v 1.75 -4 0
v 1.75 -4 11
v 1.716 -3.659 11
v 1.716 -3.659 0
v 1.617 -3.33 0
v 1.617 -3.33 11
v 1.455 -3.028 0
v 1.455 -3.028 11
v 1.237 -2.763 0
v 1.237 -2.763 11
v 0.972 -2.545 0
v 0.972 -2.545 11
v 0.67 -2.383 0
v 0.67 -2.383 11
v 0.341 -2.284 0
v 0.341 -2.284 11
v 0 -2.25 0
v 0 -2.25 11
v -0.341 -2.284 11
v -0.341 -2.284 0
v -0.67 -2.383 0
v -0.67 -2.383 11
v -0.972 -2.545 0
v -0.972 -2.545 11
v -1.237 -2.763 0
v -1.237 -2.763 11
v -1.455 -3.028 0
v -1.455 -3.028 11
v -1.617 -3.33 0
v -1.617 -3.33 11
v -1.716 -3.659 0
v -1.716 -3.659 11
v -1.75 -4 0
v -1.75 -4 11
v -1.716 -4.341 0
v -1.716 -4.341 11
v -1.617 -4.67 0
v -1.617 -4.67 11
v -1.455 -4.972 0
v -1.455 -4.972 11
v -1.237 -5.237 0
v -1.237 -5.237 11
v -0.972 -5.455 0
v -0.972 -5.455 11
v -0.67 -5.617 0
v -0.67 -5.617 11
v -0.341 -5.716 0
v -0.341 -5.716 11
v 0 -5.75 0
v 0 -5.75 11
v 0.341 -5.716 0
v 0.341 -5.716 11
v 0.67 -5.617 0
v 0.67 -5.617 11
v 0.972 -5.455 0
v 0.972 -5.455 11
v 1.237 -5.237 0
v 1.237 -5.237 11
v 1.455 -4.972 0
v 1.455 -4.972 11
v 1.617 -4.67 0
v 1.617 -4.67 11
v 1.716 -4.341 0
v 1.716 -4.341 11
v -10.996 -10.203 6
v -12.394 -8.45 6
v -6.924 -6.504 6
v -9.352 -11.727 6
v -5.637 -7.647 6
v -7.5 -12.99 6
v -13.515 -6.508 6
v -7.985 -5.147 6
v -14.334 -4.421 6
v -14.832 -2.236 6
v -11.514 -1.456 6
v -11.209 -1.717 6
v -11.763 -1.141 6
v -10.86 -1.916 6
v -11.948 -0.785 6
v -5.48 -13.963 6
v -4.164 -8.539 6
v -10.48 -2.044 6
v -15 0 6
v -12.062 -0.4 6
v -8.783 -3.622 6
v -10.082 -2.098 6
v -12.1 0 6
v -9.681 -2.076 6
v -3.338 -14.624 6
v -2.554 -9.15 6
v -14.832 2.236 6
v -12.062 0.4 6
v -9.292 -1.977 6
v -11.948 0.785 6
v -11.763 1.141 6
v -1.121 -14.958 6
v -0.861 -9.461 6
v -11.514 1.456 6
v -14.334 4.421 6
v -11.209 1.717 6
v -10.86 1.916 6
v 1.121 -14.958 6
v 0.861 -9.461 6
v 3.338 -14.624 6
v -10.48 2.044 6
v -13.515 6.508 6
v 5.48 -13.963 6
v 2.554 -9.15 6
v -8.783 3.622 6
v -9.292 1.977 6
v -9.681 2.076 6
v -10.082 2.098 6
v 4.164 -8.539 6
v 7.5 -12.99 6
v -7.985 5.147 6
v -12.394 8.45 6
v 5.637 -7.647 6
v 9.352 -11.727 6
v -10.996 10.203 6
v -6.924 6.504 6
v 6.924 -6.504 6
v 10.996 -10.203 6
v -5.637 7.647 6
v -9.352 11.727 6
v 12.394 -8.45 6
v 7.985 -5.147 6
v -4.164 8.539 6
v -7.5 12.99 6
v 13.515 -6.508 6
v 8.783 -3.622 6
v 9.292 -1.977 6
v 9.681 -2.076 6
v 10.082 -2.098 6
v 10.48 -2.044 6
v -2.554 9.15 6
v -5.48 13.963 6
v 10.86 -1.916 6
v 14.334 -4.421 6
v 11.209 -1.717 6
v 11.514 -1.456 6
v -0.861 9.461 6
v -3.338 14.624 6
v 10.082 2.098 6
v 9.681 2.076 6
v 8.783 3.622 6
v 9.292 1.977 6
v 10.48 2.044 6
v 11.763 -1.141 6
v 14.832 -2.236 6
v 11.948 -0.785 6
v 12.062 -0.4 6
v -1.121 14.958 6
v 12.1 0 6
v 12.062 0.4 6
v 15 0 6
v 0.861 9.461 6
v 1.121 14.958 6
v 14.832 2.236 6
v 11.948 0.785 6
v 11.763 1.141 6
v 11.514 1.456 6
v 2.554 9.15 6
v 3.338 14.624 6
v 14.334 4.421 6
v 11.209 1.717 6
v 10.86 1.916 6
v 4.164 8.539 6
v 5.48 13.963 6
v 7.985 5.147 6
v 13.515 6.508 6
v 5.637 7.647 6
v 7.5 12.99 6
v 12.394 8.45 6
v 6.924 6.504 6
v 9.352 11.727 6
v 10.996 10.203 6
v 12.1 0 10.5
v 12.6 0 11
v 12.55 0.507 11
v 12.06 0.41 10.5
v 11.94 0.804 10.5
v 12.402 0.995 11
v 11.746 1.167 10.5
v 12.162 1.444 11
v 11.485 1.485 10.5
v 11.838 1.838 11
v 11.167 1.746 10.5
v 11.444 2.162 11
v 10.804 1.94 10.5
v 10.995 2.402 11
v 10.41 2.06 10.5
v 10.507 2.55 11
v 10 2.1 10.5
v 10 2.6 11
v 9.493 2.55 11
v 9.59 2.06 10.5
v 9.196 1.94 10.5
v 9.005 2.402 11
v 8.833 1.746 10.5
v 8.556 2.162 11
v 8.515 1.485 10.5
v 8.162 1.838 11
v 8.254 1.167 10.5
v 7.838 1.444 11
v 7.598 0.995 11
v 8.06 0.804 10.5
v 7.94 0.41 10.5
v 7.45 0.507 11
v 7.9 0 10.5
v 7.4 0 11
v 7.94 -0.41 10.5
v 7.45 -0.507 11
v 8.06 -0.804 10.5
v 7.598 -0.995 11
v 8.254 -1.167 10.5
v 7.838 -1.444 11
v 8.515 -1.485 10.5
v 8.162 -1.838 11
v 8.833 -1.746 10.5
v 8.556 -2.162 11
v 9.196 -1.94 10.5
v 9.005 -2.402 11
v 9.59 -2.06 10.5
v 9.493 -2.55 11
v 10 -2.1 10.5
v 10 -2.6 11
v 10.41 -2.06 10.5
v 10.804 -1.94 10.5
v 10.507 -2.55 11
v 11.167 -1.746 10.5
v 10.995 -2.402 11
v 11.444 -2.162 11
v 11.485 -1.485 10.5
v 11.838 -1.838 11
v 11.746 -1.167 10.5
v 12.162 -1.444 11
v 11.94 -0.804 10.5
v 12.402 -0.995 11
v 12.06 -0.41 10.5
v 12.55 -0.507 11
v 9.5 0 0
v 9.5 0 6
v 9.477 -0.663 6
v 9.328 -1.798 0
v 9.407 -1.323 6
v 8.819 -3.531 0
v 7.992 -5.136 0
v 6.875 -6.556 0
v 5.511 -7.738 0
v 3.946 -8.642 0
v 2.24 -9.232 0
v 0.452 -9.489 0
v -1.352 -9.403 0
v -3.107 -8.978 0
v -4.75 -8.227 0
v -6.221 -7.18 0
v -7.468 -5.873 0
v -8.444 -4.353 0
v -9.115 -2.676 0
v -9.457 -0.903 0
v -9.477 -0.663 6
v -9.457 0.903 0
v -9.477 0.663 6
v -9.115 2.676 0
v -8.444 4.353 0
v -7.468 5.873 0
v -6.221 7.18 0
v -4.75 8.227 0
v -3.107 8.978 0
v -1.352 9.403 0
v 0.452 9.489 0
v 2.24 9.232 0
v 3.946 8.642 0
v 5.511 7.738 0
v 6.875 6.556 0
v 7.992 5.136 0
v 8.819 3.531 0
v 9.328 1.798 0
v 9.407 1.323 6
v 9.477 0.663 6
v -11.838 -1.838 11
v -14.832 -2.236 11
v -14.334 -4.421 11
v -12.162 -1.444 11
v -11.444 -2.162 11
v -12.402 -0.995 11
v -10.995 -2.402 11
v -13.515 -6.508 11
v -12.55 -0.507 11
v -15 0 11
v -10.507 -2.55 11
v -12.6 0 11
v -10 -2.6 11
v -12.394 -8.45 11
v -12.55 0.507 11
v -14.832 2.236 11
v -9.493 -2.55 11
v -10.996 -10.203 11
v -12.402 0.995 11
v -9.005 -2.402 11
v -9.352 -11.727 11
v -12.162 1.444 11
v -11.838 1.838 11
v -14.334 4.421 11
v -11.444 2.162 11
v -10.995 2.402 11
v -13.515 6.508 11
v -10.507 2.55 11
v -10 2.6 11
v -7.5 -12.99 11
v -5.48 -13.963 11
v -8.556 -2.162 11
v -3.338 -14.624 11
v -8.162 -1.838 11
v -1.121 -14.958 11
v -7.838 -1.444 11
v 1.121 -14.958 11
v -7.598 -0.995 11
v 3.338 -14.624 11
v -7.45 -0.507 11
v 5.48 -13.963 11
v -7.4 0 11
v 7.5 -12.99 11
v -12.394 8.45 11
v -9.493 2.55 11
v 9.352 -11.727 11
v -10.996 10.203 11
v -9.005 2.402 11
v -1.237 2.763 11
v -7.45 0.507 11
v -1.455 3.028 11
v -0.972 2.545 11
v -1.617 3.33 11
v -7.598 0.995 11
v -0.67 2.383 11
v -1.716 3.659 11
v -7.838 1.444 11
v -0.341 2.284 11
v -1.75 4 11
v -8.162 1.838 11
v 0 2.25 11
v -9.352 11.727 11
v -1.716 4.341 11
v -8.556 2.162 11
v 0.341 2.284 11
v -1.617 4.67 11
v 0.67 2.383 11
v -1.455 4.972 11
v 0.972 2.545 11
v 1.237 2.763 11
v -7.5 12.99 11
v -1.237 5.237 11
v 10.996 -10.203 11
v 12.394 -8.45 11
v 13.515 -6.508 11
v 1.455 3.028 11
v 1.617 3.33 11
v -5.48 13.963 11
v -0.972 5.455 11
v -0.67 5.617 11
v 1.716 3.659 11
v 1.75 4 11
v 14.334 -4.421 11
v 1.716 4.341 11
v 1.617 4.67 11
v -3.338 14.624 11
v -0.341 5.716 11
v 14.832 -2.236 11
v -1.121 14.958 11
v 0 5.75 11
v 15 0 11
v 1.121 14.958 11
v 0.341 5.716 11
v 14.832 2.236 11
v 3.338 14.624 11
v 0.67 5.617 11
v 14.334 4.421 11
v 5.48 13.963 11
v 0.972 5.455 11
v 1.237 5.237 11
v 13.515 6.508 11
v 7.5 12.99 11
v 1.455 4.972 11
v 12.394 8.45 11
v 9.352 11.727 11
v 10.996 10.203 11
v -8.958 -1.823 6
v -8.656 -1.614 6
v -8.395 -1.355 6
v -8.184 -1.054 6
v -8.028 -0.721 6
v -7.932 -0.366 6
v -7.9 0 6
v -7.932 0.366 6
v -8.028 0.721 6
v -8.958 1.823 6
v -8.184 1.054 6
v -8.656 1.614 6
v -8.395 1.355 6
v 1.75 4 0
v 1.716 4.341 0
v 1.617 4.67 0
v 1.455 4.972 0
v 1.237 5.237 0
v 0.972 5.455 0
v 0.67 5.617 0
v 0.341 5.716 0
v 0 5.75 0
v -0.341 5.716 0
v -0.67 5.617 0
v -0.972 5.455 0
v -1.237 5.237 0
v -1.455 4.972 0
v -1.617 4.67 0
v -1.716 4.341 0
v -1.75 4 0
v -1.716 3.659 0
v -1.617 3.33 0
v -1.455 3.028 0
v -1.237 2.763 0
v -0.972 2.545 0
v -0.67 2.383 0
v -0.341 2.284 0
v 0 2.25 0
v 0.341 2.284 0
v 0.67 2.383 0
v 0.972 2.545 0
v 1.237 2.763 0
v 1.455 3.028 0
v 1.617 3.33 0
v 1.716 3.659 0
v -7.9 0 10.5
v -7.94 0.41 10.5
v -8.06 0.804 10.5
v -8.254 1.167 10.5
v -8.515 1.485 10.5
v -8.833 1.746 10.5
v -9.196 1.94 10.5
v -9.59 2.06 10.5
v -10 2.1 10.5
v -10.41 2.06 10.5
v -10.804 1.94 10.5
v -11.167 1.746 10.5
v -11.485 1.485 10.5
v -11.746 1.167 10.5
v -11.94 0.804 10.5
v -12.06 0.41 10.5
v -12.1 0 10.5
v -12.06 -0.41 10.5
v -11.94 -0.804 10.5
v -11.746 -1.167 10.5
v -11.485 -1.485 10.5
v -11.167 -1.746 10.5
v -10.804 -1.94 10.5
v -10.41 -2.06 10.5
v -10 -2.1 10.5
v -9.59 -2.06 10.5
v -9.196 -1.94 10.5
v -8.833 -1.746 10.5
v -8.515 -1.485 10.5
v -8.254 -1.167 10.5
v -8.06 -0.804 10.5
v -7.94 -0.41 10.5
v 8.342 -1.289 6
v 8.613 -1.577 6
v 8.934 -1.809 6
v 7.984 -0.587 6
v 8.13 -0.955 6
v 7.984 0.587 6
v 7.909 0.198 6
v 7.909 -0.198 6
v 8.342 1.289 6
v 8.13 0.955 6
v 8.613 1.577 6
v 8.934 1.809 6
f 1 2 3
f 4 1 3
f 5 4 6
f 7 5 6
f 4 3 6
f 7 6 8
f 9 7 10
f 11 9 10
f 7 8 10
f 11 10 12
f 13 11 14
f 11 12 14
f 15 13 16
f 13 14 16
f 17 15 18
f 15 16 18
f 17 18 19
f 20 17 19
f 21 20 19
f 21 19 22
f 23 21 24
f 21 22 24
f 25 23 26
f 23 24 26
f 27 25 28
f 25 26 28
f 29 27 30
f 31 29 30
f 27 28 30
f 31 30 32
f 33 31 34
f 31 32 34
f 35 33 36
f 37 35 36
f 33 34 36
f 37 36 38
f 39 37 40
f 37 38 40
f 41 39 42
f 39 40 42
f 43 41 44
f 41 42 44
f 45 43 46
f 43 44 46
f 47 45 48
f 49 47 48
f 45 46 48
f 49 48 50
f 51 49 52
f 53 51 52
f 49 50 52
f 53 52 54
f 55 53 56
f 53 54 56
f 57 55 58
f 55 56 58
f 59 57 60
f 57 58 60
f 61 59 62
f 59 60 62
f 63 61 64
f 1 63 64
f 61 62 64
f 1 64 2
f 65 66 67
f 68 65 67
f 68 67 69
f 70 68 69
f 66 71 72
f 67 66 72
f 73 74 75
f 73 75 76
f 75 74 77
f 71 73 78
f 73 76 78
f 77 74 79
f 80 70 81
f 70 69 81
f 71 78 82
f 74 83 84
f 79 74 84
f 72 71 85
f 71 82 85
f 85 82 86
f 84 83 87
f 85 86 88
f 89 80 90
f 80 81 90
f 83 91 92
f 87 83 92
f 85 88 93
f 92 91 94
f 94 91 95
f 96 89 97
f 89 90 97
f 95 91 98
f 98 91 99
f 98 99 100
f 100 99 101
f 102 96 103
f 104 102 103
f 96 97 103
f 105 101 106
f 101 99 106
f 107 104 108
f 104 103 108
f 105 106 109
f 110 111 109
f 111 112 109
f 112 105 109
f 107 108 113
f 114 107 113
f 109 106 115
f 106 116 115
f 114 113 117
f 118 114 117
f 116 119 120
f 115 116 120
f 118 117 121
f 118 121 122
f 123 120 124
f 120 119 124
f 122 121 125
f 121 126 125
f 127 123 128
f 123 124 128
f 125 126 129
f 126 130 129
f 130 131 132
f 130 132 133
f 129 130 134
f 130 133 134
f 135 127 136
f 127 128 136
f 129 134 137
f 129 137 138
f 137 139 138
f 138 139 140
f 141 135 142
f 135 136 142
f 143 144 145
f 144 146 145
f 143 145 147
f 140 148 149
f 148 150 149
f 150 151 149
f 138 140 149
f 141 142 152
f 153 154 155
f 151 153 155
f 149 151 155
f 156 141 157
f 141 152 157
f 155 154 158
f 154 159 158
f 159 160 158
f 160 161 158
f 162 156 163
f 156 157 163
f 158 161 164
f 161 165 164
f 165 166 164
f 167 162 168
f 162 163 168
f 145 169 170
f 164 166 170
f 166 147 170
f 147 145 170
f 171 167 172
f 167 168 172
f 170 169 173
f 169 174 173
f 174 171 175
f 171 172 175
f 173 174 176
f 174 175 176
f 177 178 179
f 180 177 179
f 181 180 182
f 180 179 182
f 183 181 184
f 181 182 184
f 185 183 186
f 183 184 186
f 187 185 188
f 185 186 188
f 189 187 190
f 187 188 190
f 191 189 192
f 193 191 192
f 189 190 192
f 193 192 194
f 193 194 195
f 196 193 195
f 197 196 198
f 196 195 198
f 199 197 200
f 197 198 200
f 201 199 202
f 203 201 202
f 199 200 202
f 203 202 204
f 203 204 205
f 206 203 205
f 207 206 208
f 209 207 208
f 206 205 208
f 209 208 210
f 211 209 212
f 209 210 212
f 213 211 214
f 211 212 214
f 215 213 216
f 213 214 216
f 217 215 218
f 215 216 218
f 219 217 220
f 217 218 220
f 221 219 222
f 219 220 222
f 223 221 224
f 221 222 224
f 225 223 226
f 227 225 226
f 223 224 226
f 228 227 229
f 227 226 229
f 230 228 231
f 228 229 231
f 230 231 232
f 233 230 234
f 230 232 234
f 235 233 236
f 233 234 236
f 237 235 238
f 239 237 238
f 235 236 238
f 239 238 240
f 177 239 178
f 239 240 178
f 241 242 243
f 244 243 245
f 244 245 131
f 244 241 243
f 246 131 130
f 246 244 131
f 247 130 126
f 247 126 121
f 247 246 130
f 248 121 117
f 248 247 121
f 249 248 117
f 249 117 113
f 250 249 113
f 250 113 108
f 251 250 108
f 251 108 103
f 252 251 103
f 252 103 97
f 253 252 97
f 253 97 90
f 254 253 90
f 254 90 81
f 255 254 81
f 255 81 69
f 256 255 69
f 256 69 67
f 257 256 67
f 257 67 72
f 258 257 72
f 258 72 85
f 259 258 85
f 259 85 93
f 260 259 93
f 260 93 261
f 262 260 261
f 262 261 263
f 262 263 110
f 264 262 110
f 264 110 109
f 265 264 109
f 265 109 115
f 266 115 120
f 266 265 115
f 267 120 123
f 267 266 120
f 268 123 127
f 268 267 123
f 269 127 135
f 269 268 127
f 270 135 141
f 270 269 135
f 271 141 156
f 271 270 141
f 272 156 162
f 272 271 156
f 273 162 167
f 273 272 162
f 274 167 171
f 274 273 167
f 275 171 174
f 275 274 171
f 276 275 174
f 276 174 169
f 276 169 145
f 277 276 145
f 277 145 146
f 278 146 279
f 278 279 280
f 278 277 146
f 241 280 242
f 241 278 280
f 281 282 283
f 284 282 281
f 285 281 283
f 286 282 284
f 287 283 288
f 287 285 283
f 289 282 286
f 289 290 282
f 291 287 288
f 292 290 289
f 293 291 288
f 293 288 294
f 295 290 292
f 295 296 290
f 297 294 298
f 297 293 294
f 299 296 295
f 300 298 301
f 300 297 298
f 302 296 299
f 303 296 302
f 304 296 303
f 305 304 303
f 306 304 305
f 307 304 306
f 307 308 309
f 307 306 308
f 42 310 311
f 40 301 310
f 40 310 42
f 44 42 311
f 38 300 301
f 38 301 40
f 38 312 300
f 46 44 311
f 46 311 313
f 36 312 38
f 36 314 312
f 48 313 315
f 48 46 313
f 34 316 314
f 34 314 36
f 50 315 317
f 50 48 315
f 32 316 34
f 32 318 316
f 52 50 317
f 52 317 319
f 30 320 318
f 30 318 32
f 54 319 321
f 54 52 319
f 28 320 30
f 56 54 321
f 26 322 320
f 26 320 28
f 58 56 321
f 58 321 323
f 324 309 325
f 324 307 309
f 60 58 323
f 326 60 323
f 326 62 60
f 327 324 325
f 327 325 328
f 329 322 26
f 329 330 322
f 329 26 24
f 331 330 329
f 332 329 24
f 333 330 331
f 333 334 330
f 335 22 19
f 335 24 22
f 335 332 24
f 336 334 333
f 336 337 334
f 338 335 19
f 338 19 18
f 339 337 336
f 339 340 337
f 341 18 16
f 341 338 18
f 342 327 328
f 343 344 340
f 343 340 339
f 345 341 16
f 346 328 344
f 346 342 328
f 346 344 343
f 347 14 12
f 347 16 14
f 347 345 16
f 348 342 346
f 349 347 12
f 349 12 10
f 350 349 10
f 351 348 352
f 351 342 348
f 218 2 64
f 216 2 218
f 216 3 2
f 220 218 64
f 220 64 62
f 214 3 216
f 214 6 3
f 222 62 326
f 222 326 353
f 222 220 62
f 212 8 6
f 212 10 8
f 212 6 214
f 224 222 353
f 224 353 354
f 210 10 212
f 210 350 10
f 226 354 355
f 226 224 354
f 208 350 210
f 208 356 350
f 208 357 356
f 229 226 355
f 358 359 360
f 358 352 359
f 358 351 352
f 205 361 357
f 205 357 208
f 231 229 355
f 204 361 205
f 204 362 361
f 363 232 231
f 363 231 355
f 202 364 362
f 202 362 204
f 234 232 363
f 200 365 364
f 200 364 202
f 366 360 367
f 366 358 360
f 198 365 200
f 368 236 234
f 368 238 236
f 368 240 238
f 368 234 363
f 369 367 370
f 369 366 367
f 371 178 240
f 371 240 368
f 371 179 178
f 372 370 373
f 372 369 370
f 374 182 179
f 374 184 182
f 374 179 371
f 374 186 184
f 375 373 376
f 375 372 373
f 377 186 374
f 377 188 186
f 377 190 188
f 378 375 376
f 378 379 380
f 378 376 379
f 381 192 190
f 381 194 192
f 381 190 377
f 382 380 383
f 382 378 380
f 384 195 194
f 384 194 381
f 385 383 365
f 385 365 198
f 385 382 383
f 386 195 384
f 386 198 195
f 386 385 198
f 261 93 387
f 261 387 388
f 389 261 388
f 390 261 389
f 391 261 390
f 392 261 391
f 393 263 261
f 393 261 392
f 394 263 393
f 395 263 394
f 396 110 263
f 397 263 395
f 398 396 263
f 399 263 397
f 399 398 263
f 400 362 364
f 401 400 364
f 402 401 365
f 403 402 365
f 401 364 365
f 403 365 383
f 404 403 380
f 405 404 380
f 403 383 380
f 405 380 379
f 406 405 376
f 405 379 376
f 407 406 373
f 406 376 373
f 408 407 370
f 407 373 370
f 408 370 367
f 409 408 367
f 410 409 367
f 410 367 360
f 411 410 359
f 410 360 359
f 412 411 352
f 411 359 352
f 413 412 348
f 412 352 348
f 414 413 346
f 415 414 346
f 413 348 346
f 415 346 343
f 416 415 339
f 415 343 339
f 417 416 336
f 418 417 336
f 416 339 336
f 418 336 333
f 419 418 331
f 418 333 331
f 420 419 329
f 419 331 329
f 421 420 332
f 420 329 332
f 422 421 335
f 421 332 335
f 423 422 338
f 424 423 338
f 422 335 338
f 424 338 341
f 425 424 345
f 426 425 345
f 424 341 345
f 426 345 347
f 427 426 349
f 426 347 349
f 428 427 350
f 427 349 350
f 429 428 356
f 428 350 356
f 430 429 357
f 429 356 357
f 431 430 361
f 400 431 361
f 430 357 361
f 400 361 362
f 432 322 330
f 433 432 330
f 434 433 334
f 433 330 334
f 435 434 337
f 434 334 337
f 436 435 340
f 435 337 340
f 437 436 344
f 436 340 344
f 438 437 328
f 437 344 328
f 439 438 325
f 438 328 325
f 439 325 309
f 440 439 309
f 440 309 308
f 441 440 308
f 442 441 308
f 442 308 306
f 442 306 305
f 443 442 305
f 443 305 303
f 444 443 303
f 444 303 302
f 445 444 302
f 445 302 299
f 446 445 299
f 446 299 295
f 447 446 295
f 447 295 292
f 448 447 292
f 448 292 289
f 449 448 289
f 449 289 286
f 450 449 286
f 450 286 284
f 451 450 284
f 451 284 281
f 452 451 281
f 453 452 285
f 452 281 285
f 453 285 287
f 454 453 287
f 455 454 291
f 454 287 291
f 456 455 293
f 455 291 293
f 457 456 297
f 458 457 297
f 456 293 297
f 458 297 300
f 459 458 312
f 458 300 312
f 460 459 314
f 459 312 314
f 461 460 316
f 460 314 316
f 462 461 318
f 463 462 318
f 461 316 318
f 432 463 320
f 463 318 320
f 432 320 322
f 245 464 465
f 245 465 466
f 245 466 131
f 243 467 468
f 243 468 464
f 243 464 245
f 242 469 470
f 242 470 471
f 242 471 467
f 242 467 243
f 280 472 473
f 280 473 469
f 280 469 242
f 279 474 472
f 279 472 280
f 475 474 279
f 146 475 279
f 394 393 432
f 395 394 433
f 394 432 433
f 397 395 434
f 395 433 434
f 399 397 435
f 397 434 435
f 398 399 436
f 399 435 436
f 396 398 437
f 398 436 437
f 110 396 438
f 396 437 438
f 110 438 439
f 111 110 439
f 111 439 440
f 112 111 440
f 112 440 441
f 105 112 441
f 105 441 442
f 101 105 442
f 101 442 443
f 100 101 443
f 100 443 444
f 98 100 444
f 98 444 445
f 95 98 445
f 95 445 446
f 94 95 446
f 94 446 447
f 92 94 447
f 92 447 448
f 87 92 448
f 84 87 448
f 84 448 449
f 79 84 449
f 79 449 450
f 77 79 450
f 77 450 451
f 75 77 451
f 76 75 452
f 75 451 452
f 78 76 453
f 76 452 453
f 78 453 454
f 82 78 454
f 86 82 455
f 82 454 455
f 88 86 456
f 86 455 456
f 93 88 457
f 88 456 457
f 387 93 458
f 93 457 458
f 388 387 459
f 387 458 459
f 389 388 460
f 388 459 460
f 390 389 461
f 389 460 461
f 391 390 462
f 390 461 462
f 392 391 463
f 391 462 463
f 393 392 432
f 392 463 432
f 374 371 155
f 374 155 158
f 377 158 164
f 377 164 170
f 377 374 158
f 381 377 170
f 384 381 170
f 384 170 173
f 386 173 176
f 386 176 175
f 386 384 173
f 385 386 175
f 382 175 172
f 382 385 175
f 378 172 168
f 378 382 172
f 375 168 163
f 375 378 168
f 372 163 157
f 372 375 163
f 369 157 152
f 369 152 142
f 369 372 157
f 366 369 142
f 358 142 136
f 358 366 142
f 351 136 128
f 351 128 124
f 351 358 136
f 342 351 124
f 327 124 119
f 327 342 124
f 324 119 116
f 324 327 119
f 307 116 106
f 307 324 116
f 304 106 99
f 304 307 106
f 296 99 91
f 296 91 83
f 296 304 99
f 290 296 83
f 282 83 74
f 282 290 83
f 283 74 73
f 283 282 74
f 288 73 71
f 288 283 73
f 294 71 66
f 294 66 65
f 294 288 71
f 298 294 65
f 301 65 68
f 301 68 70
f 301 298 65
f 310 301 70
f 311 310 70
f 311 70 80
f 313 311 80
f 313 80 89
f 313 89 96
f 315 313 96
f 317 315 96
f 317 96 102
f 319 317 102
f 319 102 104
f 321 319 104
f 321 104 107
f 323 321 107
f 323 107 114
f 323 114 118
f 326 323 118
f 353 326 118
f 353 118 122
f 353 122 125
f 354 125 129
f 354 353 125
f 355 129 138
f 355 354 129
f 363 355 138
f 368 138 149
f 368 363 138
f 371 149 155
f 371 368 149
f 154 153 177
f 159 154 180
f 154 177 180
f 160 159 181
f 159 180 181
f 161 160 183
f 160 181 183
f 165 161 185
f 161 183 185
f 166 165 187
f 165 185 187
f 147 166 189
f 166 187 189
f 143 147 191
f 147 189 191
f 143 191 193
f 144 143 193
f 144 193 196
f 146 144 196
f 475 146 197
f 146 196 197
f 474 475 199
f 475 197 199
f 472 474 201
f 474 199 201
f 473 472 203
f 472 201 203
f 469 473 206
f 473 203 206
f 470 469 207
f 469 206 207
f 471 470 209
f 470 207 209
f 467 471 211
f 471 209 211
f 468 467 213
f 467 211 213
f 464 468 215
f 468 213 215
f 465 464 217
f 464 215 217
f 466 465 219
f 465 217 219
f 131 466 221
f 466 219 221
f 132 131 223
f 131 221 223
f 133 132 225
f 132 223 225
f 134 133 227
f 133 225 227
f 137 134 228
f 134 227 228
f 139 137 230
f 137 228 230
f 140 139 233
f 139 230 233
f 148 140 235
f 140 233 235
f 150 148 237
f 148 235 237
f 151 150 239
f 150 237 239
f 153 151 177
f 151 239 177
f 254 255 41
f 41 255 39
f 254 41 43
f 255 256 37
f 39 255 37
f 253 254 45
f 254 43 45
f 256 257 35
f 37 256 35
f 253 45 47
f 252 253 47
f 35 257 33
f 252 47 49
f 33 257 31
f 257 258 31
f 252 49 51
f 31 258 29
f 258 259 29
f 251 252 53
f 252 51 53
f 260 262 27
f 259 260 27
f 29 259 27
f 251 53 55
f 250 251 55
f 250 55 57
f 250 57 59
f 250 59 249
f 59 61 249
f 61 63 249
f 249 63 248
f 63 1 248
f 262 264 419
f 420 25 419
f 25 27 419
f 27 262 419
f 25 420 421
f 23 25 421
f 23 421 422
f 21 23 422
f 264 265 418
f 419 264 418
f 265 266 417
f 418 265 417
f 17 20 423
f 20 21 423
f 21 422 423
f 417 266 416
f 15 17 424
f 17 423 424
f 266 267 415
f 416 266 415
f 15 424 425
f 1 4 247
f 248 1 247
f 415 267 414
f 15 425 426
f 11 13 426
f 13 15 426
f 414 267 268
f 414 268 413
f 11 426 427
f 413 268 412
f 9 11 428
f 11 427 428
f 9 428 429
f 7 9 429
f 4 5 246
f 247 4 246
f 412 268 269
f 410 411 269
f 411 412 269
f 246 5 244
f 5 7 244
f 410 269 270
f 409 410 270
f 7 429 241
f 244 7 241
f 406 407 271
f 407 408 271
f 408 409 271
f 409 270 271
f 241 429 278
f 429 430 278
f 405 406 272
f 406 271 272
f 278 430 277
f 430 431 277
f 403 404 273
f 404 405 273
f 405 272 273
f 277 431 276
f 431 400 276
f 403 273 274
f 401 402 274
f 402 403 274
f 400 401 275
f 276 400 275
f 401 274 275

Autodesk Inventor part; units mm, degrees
ref_plane "YZ Plane" through (0, 0, 0) normal (1, 0, 0) x (0, 1, 0)
ref_plane "XZ Plane" through (0, 0, 0) normal (0, 1, 0) x (-1, 0, 0)
ref_plane "XY Plane" through (0, 0, 0) normal (0, 0, 1) x (1, 0, 0)
sketch "Sketch2" plane through (0, 0, 0) normal (0, 0, 1) x (1, 0, 0)
  circle A0 centre (0, 0) radius 9.5
  dimension "d0" = 19
extrude "Extrusion1" add sketch "Sketch2" along normal blind 11
sketch "Sketch5" plane through (0, 0, 11) normal (0, 0, 1) x (1, 0, 0)
  circle A0 centre (0, 0) radius 15
  dimension "d17" = 30
extrude "Extrusion4" add sketch "Sketch5" against normal blind 5
sketch "Sketch3" plane through (0, 0, 11) normal (0, 0, 1) x (1, 0, 0)
  circle A0 centre (0, -4) radius 1.75
  circle A1 centre (0, 4) radius 1.75
  line L0 (0, -9.5) -> (0, 9.5) construction
  circle A2 centre (0, 0) radius 9.5 construction
  dimension "d3" = 3.5
  dimension "d4" = 3.5
  dimension "d5" = 8
  dimension "d6" = 4
extrude "Extrusion2" cut sketch "Sketch3" against normal through all
sketch "Sketch4" plane through (0, 0, 11) normal (0, 0, 1) x (1, 0, 0)
  circle A0 centre (-10, 0) radius 2.1
  circle A1 centre (10, 0) radius 2.1
  line L0 (10, 0) -> (-10, 0) construction
  point P0 (0, 0)
  point P1 (0, 0)
  dimension "d9" = 4.2
  dimension "d10" = 4.2
  dimension "d11" = 20
extrude "Extrusion3" cut sketch "Sketch4" against normal blind 5
chamfer "Chamfer1" distance 0.5 angle 45 2 edges at (7.9, 0, 11) (-12.1, 0, 11)
equation "\"d5\" = 2 * d6"
properties part number "Motor Adapter"
